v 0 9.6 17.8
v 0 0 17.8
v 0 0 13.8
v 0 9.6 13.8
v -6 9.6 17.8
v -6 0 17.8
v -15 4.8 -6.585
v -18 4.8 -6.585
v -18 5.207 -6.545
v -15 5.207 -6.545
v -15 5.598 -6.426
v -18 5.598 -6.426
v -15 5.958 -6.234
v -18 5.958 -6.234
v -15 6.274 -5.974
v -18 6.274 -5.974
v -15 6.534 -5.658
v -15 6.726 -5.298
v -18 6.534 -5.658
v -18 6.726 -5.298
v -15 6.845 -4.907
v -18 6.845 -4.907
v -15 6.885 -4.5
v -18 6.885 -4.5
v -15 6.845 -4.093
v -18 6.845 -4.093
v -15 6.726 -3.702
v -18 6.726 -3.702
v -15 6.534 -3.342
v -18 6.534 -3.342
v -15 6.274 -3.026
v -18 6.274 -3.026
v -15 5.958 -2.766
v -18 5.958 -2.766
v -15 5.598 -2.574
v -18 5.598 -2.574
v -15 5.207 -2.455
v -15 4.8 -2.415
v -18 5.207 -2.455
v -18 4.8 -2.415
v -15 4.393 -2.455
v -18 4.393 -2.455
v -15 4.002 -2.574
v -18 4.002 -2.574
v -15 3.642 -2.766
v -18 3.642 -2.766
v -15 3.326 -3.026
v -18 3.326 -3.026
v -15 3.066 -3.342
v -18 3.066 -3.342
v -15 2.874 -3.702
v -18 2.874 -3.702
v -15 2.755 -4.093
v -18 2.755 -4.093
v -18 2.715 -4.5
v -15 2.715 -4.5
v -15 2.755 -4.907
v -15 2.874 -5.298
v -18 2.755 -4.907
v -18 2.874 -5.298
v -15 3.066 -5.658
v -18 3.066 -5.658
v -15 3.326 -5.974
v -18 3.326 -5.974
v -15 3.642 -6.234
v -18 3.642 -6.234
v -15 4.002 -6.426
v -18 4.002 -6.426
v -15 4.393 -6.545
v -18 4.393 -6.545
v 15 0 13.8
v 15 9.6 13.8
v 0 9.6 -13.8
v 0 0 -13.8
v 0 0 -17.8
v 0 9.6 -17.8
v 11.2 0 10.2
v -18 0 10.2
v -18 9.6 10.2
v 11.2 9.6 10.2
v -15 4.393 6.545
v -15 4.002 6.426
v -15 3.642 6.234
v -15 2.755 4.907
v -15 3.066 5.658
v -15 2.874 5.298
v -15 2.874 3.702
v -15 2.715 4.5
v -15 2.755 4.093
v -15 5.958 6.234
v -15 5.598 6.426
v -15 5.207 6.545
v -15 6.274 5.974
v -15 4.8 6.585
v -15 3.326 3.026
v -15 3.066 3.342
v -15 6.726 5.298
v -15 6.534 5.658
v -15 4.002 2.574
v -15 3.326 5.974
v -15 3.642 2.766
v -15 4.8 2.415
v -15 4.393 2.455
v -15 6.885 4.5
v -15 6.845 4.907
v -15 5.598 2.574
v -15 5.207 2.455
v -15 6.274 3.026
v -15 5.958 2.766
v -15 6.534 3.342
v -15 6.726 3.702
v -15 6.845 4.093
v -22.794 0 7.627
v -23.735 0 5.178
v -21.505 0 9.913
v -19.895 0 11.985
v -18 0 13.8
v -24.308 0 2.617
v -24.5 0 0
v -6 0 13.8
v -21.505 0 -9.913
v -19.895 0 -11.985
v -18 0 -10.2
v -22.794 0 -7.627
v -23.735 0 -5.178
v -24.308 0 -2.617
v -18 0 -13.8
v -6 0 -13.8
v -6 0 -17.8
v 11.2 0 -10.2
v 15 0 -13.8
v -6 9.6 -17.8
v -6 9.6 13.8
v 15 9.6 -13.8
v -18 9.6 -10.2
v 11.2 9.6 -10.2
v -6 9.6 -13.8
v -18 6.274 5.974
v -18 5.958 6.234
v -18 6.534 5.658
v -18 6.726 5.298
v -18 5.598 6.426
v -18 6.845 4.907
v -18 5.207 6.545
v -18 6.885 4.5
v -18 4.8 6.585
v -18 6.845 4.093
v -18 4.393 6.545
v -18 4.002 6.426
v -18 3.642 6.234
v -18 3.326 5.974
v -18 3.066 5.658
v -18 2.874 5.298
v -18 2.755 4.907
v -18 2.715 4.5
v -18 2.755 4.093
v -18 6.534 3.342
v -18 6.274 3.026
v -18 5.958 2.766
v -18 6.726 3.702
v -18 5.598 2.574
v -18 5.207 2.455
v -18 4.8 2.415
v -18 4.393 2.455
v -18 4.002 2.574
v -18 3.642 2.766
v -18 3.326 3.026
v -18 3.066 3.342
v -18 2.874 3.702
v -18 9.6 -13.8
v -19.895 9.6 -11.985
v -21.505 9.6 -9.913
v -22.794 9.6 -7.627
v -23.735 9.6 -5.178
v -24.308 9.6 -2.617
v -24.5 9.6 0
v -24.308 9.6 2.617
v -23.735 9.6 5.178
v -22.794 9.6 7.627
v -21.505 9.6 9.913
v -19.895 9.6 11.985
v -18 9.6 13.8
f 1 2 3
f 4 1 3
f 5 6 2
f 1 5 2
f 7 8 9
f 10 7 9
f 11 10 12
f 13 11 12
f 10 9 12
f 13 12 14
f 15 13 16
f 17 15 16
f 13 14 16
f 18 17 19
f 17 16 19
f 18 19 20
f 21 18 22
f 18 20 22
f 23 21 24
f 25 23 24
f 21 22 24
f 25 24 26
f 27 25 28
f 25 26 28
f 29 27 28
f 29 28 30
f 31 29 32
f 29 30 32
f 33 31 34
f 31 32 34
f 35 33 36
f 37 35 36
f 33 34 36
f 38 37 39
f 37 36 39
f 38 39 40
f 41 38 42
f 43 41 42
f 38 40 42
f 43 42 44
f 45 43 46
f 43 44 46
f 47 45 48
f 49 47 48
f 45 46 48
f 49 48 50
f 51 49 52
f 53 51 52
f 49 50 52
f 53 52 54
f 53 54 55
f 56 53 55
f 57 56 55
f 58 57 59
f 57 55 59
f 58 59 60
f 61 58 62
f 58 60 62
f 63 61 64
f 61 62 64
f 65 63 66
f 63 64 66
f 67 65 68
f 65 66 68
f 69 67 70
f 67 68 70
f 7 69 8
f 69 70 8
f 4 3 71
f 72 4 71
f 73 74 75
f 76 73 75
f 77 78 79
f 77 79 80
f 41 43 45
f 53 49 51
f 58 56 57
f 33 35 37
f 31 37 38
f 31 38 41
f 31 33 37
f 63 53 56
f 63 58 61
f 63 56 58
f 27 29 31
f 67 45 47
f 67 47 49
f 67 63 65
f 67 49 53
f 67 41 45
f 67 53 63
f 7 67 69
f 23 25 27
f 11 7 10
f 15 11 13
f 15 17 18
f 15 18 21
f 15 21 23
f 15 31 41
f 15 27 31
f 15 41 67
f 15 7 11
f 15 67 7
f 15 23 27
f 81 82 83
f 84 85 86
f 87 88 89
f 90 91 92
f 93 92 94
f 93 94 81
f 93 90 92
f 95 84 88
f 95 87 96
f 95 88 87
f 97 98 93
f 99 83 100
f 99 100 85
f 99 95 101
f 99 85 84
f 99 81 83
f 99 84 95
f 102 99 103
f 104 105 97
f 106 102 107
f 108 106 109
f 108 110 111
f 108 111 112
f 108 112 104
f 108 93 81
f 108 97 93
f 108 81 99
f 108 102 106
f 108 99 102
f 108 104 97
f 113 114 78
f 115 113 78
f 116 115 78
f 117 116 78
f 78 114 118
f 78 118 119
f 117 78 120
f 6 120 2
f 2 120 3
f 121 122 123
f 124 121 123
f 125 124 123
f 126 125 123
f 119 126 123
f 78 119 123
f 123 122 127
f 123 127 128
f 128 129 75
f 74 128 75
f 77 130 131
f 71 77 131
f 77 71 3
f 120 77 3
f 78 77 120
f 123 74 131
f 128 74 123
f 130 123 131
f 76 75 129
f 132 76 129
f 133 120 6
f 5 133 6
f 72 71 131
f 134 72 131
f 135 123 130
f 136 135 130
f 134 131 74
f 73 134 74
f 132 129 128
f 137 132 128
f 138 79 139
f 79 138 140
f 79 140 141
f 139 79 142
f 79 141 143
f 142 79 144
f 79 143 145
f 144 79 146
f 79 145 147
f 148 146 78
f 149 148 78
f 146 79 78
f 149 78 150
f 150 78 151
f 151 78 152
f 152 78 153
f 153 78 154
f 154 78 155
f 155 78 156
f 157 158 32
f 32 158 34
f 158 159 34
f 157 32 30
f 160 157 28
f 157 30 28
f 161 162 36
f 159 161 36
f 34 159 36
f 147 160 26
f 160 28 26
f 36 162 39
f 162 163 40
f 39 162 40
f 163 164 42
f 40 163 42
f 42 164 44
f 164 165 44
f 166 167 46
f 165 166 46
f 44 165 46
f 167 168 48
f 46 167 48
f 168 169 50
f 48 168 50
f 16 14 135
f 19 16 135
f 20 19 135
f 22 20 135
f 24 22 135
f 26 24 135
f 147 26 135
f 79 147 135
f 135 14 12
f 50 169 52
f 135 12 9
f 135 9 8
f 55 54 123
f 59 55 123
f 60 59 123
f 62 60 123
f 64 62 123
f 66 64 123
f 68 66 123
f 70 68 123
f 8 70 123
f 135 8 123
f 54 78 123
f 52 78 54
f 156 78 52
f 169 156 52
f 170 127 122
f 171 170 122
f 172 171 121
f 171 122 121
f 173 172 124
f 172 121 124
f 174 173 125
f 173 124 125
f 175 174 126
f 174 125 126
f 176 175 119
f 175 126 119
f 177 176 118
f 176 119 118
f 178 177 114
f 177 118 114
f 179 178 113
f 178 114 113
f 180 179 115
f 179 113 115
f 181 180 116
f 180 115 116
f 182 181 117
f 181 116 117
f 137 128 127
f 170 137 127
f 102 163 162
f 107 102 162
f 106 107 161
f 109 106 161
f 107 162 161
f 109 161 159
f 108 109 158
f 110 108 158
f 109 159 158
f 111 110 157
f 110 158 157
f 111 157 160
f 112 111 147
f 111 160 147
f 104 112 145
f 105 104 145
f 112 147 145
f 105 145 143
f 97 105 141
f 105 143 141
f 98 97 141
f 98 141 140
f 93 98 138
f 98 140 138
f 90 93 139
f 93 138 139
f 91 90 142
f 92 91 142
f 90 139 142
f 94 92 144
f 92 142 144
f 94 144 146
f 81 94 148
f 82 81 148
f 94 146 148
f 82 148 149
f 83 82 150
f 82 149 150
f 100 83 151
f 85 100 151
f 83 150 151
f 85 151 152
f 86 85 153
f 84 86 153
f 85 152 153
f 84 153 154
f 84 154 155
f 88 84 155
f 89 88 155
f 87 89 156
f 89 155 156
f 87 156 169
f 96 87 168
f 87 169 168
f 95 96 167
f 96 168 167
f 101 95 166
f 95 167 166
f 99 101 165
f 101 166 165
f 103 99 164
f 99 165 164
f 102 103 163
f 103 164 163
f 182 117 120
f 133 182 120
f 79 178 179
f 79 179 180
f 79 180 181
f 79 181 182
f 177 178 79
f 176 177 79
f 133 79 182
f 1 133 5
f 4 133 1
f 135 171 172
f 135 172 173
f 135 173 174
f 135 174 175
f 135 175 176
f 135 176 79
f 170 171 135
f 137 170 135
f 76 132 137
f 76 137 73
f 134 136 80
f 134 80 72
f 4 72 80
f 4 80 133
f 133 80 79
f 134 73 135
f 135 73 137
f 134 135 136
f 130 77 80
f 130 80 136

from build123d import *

# Parameters (mm, degrees)
SKETCH1_W           = 29.2
SKETCH1_H           = 20.4
BOSS_EXTRUDE1_DEPTH = 9.6
SKETCH3_R           = 2.085
BOSS_EXTRUDE3_DEPTH = 3


with BuildPart() as part:
    # Sketch1 → Boss-Extrude1 (new body)
    with BuildSketch(Plane(origin=(0, 0, 0), x_dir=(1, 0, 0), z_dir=(0, 1, 0))):
        with BuildLine():
            Line((-6, 13.8), (-18, 13.8))
            ThreePointArc((-18, 13.8), (-24.5, 0), (-18, -13.8))
            Line((-18, -13.8), (-6, -13.8))
            Line((-6, -13.8), (-6, -17.8))
            Line((-6, -17.8), (0, -17.8))
            Line((0, -17.8), (0, -13.8))
            Line((0, -13.8), (15, -13.8))
            Line((15, -13.8), (15, 13.8))
            Line((15, 13.8), (0, 13.8))
            Line((0, 13.8), (0, 17.8))
            Line((0, 17.8), (-6, 17.8))
            Line((-6, 17.8), (-6, 13.8))
        make_face()
        with Locations((-3.4, 0)):
            Rectangle(SKETCH1_W, SKETCH1_H, mode=Mode.SUBTRACT)
    extrude(amount=BOSS_EXTRUDE1_DEPTH)

    # Sketch3 → Boss-Extrude3 (add)
    with BuildSketch(Plane(origin=(-18, 0, 0), x_dir=(0, 0, -1), z_dir=(1, 0, 0))):
        with Locations((-4.5, 4.8)):
            Circle(SKETCH3_R)
        with Locations((4.5, 4.8)):
            Circle(SKETCH3_R)
    extrude(amount=BOSS_EXTRUDE3_DEPTH)


solid = part.part
